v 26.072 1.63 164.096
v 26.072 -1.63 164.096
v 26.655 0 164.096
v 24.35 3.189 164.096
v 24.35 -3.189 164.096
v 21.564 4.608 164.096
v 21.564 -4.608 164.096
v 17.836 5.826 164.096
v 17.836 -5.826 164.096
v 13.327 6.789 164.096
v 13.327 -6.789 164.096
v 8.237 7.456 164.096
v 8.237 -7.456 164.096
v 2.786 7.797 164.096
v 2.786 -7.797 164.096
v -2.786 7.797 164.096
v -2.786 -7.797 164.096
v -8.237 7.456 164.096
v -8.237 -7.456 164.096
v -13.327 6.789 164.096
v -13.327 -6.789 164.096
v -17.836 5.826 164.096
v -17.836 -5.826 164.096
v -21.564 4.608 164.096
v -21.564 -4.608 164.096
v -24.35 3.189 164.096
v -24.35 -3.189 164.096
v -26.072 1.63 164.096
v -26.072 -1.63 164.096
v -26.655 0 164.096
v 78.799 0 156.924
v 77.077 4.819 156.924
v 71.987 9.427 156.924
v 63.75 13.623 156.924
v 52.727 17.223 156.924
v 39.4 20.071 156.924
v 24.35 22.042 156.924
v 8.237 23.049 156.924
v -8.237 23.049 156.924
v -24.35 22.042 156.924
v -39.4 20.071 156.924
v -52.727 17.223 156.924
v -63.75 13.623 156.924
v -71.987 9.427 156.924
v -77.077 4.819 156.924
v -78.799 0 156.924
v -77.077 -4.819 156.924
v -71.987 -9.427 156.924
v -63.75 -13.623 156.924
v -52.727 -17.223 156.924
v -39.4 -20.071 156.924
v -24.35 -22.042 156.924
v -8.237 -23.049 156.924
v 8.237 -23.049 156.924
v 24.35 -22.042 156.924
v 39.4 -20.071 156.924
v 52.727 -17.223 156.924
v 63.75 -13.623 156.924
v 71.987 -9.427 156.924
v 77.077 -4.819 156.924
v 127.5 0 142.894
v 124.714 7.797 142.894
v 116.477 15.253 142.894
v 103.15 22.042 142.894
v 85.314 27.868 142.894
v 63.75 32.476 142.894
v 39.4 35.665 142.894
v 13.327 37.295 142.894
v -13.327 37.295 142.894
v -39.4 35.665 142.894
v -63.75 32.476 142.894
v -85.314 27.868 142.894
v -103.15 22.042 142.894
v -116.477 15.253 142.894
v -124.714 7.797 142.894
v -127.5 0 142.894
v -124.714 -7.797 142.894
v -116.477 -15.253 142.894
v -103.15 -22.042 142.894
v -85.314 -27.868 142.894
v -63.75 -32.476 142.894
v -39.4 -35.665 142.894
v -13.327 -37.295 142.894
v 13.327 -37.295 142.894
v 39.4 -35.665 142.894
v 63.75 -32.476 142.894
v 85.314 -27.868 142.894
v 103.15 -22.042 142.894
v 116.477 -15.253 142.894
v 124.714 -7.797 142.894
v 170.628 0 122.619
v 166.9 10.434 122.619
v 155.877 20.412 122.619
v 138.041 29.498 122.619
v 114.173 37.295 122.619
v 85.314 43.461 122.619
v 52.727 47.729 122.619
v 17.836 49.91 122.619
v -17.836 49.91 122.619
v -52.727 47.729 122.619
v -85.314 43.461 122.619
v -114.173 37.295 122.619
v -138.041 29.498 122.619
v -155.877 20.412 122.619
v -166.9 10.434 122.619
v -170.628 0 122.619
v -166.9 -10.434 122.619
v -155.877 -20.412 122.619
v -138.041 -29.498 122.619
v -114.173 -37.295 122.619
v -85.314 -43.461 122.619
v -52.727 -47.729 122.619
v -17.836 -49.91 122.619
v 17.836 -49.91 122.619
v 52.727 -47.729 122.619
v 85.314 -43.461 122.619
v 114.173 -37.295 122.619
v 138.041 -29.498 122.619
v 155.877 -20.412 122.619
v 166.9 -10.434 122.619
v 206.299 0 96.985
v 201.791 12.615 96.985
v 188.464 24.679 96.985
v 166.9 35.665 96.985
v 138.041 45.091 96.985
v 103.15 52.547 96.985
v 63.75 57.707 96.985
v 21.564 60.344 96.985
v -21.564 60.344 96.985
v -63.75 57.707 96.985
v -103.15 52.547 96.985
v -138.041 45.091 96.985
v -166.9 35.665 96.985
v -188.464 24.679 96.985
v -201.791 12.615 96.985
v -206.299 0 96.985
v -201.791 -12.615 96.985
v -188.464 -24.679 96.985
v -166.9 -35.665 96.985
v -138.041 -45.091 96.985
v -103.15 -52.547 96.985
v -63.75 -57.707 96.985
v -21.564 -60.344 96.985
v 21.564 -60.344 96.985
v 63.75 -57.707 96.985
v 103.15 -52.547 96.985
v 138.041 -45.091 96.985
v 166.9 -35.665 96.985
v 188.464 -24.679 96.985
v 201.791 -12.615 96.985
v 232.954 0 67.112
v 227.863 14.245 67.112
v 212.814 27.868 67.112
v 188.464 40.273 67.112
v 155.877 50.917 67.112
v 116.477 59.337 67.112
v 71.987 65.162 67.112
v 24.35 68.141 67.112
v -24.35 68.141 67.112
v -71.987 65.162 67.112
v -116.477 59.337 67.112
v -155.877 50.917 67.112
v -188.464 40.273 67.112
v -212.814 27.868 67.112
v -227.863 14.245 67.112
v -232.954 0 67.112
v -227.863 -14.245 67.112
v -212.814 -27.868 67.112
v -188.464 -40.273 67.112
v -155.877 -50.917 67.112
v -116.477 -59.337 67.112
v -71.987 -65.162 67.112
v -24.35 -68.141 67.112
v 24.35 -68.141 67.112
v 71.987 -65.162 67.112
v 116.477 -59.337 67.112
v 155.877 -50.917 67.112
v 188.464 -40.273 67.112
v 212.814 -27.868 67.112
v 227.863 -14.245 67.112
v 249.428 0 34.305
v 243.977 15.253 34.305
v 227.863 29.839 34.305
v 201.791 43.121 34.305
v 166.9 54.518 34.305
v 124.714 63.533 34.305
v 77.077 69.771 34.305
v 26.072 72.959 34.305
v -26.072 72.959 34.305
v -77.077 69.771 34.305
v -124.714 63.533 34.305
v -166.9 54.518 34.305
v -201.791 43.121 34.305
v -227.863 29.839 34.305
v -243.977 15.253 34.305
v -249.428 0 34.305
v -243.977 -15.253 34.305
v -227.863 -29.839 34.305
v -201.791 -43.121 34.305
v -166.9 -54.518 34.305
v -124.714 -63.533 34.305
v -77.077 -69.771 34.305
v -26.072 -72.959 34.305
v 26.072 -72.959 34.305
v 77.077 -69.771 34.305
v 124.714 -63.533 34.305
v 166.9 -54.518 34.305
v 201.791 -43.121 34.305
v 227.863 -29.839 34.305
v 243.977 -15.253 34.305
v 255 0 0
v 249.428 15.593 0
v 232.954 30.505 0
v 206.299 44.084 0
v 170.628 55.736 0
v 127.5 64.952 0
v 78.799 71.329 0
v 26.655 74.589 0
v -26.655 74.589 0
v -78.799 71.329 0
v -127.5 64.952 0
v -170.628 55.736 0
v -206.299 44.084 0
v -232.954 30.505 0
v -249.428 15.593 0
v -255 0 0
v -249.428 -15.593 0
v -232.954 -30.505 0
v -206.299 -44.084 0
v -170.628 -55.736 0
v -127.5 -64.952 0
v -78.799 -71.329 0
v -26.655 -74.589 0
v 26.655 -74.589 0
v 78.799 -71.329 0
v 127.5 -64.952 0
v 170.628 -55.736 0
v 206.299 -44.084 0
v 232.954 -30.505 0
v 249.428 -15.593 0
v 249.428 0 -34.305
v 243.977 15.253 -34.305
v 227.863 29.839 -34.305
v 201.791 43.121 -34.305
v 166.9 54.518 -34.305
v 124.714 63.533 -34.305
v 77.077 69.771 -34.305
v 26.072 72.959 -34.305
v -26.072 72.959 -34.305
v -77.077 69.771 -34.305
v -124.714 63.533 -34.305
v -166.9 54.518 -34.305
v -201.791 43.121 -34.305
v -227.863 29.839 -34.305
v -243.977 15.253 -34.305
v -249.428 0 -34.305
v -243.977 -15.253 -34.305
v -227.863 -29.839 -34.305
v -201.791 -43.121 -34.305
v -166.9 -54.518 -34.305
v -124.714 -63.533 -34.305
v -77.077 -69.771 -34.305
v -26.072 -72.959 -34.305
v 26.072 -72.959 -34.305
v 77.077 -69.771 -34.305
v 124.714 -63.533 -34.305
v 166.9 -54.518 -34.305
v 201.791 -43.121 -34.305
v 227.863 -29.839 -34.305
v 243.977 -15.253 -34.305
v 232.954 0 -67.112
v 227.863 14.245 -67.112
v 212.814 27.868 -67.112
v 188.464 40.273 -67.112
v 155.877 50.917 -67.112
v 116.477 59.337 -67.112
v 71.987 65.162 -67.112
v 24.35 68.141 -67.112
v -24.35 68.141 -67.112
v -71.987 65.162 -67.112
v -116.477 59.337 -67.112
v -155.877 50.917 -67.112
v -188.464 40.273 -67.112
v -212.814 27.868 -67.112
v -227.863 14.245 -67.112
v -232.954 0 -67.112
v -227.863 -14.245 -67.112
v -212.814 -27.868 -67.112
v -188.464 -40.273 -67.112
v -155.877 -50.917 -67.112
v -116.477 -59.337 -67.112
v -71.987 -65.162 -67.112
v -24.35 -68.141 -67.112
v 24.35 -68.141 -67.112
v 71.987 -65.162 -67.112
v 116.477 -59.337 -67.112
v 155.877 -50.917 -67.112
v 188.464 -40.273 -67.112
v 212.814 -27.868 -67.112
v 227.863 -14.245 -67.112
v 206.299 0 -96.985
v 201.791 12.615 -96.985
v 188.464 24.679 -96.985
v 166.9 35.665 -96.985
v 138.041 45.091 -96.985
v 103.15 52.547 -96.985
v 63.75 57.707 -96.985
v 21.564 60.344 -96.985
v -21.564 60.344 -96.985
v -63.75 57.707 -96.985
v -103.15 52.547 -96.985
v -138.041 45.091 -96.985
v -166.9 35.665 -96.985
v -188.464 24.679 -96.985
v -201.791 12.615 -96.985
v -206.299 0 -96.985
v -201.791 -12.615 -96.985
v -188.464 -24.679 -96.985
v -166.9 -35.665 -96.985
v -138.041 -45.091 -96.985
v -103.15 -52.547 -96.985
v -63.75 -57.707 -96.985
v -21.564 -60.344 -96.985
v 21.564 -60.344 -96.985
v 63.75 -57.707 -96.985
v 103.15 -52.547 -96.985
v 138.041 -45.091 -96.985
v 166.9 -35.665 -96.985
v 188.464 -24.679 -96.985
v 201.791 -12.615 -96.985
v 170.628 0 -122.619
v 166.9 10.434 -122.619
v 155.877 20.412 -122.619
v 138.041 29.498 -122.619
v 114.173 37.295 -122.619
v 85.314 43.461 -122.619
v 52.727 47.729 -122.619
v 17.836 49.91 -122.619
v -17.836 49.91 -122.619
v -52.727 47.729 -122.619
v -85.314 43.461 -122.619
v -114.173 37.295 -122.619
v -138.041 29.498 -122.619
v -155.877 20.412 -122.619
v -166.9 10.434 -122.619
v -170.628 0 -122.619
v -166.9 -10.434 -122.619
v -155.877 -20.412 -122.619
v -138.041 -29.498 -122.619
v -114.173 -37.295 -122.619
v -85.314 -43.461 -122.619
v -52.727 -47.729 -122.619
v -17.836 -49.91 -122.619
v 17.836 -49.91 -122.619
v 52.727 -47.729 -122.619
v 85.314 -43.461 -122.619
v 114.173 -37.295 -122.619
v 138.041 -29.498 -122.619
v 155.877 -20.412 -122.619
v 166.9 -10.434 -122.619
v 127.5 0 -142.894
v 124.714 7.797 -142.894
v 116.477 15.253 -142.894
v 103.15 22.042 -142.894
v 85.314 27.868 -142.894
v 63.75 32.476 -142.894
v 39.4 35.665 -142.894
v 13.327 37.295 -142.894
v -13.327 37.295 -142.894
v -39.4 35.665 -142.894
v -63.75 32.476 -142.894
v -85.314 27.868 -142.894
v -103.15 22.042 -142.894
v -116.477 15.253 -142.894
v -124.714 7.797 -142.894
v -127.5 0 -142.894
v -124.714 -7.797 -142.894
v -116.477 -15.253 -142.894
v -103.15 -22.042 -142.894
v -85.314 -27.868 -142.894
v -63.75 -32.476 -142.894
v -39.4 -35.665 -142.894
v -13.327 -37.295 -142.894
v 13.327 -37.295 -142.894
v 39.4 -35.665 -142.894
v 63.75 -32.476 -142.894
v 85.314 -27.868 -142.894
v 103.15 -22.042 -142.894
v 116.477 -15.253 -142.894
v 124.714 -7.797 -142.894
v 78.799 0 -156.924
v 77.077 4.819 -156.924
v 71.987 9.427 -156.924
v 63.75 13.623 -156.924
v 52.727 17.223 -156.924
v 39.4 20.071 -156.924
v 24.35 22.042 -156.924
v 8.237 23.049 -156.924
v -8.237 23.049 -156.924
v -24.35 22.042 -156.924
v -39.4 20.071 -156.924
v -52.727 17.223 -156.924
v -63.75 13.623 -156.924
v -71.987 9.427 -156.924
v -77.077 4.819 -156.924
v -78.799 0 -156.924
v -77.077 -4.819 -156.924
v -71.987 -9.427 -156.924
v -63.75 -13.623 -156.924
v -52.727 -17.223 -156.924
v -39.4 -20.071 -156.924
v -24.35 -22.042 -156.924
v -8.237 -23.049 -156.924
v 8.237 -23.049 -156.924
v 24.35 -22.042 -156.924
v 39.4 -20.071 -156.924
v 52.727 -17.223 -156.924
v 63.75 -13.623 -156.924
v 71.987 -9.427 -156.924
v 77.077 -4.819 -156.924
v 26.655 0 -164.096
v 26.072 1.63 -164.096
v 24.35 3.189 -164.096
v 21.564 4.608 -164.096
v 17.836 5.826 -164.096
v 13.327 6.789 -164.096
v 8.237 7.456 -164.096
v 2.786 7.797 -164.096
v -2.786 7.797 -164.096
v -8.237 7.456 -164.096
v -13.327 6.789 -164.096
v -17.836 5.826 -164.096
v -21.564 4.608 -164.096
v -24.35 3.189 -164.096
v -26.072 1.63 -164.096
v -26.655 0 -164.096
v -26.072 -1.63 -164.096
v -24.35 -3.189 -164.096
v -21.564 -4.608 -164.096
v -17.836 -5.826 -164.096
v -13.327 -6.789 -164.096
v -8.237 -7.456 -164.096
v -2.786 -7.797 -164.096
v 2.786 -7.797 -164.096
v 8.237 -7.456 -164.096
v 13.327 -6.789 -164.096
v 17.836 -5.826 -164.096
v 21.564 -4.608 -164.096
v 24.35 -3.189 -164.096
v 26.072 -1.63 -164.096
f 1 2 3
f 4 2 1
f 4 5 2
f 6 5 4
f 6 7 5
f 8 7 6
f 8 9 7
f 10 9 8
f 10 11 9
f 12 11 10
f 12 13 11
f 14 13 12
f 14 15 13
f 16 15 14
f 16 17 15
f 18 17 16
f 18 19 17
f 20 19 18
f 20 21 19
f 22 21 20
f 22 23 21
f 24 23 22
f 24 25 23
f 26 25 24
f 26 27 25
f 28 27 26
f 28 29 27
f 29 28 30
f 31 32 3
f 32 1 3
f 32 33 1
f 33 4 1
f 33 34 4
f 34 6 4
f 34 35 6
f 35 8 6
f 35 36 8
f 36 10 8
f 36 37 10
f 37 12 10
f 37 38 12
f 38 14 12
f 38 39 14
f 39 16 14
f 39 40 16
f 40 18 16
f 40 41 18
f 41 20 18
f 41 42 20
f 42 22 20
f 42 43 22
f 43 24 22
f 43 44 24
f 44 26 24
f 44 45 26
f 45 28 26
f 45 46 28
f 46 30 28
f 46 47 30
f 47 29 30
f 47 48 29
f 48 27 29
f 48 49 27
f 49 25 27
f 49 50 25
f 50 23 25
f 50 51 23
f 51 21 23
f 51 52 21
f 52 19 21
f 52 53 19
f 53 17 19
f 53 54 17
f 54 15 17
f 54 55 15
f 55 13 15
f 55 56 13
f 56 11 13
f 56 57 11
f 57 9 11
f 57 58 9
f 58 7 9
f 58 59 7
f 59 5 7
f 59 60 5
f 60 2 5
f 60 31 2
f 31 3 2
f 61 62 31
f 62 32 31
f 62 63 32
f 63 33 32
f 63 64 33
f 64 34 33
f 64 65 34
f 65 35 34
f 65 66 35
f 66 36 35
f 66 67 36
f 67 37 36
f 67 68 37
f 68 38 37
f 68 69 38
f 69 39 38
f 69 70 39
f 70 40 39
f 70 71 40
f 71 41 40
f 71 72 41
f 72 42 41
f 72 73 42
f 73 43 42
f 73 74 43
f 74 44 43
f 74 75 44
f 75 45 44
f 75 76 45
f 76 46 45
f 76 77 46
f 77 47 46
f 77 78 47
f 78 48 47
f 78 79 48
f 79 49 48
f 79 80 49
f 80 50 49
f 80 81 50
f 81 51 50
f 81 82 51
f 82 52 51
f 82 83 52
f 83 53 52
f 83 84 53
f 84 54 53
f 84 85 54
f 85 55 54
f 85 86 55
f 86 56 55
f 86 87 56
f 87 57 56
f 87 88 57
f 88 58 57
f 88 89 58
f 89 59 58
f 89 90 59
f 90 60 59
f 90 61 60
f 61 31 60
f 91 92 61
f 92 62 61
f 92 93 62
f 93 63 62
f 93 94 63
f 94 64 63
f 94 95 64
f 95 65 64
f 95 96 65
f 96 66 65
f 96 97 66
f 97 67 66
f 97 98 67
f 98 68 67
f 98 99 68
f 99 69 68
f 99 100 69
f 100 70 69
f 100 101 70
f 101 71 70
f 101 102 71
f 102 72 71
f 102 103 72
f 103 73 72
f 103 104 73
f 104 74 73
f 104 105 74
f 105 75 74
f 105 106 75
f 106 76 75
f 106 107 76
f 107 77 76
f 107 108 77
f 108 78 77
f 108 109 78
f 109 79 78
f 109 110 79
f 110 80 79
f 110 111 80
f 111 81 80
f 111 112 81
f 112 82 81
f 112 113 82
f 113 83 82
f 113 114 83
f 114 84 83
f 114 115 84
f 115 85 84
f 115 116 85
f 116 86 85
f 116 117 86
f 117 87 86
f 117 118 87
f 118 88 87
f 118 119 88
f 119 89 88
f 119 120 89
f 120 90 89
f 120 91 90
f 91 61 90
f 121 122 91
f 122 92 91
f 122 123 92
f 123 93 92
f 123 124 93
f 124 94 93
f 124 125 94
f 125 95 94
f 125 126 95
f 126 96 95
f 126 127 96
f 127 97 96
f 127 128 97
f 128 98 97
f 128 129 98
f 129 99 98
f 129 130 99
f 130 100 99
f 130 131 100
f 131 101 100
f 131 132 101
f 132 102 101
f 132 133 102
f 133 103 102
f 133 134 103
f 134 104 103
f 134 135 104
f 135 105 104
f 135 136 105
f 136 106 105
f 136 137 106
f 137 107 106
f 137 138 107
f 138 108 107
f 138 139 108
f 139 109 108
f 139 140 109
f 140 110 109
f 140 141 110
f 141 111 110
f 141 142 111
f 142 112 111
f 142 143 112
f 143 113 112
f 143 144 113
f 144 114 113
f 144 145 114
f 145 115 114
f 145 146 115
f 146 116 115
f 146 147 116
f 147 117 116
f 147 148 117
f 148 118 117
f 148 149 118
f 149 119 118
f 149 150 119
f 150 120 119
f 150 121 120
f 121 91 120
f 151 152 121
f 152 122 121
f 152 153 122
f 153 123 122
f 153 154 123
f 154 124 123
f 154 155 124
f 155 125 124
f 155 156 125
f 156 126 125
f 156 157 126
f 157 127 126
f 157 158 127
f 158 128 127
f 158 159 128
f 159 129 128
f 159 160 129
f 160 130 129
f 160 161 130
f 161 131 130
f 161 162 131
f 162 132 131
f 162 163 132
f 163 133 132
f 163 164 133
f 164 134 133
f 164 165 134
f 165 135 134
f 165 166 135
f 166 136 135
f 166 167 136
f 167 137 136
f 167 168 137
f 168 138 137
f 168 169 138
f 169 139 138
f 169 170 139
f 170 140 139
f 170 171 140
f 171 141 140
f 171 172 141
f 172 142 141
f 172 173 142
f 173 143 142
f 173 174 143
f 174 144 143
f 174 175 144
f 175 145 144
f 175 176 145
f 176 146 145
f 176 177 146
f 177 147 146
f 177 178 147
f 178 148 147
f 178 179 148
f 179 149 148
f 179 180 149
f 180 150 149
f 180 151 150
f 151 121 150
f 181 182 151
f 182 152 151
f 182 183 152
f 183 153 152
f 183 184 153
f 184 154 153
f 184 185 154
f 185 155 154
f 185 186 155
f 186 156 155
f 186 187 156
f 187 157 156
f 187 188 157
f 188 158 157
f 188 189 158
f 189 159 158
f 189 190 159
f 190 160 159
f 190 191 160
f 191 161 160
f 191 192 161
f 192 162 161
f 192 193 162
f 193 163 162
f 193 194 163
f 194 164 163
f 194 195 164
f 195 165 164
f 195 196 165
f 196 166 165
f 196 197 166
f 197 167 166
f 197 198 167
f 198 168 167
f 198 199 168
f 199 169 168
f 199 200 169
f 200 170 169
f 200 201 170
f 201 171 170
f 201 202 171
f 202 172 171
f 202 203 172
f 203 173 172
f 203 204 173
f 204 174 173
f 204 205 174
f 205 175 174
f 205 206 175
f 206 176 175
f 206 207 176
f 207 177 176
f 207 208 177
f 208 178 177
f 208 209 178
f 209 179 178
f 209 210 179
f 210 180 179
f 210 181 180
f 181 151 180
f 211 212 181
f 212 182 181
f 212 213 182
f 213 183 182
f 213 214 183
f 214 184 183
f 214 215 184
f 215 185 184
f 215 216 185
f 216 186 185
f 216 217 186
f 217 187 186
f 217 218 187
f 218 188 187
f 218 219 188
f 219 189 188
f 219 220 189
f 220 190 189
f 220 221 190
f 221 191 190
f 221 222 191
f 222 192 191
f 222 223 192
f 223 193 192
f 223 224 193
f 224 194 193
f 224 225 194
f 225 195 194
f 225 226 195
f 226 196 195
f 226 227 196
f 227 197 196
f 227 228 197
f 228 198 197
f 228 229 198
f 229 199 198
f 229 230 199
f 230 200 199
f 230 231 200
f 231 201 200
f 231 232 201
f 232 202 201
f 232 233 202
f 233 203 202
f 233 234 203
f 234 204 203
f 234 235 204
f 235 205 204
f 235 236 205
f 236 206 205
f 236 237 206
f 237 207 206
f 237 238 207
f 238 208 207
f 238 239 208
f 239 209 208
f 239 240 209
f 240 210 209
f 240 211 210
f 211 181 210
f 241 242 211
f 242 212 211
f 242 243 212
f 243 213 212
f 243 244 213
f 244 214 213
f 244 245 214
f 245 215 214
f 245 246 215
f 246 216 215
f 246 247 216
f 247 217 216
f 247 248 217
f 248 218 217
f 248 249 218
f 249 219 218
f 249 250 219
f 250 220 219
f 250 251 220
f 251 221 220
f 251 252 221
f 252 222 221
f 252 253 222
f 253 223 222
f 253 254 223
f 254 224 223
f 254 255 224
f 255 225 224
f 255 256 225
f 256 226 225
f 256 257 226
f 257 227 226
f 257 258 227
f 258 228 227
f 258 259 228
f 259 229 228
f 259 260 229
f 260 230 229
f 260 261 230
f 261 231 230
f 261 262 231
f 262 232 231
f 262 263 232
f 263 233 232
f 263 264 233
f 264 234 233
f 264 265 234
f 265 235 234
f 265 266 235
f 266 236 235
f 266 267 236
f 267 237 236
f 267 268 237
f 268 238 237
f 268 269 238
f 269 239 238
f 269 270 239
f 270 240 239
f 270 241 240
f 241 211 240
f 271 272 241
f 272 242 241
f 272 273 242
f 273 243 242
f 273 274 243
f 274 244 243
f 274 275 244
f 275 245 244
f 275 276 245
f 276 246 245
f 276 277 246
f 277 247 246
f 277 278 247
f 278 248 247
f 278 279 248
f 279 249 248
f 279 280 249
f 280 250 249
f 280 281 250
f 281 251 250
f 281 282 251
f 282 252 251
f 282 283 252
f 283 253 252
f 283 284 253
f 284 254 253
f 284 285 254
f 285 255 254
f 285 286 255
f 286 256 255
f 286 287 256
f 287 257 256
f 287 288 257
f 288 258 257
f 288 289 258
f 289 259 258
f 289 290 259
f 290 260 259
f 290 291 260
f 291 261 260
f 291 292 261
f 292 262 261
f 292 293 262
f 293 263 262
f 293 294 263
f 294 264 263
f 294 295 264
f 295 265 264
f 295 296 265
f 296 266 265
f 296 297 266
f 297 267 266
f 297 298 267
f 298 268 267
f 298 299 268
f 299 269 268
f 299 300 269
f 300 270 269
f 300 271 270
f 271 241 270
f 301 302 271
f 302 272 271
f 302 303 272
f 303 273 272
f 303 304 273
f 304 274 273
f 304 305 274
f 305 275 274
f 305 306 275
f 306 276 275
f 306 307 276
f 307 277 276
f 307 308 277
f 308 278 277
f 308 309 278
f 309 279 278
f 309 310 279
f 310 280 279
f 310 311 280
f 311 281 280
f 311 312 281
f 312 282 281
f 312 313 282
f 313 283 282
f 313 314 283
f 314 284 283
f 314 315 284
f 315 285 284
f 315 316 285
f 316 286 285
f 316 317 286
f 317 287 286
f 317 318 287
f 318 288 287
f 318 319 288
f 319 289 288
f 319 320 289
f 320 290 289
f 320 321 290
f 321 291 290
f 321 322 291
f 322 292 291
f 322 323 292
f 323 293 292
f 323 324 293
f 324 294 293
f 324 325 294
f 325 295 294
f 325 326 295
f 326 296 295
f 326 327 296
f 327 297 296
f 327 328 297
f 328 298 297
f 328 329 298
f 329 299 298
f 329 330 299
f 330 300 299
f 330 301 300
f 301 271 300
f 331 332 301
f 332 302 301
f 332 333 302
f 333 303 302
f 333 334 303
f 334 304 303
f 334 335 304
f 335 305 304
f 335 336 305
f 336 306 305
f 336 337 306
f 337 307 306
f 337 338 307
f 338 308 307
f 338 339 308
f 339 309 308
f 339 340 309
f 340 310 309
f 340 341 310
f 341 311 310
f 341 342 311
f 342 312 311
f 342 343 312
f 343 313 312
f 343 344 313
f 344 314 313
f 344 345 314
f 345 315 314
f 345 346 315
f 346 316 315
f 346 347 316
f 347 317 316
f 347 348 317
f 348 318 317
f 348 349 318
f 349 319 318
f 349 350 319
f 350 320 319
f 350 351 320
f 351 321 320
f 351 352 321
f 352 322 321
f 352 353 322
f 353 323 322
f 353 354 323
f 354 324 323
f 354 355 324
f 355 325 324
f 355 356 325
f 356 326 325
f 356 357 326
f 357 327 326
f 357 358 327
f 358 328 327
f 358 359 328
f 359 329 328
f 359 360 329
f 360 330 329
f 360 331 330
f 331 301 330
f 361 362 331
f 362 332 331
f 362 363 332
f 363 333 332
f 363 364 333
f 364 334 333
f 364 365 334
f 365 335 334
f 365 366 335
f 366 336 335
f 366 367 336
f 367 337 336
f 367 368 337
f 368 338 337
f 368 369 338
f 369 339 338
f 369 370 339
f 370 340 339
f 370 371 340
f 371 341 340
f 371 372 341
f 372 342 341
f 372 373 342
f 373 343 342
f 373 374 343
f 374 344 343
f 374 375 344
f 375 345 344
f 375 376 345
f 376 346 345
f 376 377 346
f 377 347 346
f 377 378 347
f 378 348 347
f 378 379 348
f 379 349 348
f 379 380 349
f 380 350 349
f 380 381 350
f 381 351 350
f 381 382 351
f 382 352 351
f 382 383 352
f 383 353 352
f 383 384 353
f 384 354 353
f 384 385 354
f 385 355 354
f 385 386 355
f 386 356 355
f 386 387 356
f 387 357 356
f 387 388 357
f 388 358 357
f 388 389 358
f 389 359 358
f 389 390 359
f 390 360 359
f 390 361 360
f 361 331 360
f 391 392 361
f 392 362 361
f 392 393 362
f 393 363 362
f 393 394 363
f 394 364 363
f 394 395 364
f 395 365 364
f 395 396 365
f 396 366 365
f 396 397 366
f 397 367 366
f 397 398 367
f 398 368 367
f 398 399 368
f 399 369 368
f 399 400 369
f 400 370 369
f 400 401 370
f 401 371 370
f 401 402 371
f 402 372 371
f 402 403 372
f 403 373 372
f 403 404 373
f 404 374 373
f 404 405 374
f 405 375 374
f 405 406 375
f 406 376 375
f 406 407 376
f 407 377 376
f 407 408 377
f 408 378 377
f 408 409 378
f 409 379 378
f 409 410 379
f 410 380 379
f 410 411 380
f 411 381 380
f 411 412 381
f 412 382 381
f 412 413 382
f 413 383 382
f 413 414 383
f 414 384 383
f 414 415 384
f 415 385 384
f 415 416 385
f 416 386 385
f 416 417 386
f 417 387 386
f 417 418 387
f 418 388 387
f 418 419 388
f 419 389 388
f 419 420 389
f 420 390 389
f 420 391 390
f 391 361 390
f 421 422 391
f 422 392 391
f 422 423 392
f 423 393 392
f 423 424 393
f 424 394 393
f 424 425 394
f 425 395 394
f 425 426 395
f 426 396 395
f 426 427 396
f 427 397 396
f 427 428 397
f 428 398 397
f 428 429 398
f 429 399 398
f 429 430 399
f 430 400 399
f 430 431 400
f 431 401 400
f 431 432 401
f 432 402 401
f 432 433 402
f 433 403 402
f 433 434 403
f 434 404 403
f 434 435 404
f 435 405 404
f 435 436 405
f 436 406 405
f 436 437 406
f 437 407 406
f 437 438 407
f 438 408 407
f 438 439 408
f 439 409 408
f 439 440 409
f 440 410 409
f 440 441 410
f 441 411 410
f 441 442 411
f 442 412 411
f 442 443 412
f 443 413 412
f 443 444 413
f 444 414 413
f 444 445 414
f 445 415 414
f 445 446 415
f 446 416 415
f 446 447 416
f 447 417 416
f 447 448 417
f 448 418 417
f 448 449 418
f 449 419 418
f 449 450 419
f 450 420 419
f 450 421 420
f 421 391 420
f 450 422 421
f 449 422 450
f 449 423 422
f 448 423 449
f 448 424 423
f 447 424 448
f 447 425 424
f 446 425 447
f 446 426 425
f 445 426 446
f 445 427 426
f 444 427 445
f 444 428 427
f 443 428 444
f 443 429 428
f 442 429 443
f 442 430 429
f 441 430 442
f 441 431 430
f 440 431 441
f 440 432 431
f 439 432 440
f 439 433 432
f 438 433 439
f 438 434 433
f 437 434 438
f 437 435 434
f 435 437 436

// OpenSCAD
// Generated by SolidPython 1.0.1 on 2020-07-29 00:46:52


scale(v = [17, 5, 11]) {
	sphere(r = 15);
}
/***********************************************
*********      SolidPython code:      **********
************************************************
 
# import packages: SolidPython
from solid import *
from solid.utils import *
from itertools import chain, combinations, permutations


class Resize:

    def __init__(self, scad_file):
        self.scad_file = scad_file
        #self.scad_file = import_scad(scad_file)
        # cone/cylinder param:
        self.r1 = 0
        self.r2 = 0
        self.h = 0
        # rectangular prism param:
        self.w = 0
        self.l = 0
        # ellipse param:
        self.r = 0

    # import OpenScad code (file name corresponds to shape)


    # classify shape + parameters
    def assign(self, param1, param2, param3):
        if self.scad_file == 'cone.scad':
            self.r1 = param1
            self.r2 = param2
            self.h = param3
        elif self.scad_file == 'cylinder.scad':
            self.r1 = param1
            self.r2 = param2
            self.h = param3
        elif self.scad_file == 'rectangularPrism.scad':
            self.h = param1
            self.l = param2
            self.w = param3
        else:
            self.r = param1
            self.h = param2

    # resize parameters
    def iterate(self):
        x = range(3, 20, 2)
        i = 1
        if self.scad_file == 'cone.scad':
            tempList = list(permutations(x, 2))
            for temp in tempList:
                param1 = temp[0]
                param2 = temp[1]
                filepath = 'produced_scad_files/' + 'cone' + str(param1) + '_' + str(param2) + '_' + '.scad'
                scad_render_to_file(cylinder(h=param1, r1=param2, r2=0), filepath)

        elif self.scad_file == 'cylinder.scad':
            tempList = list(permutations(x, 3))
            for temp in tempList:
                param1 = temp[0]
                param2 = temp[1]
                filepath = 'produced_scad_files/' + 'cylinder' + str(param1) + '_' + str(param2) + '_' + '.scad'
                scad_render_to_file(cylinder(h=param1, r1=param2, r2=param2), filepath)

        elif self.scad_file == 'rectangularPrism.scad':
            tempList = list(permutations(x, 3))
            for temp in tempList:
                param1 = temp[0]
                param2 = temp[1]
                param3 = temp[2]
                filepath = 'produced_scad_files/' + 'rectangularPrism' + str(param1) + '_' + str(param2) + '_' + str(
                    param3) + '.scad'
                scad_render_to_file(cube(size=(param1, param2, param3)), filepath)

        elif self.scad_file == 'ellipse.scad':
            tempList = list(permutations(x, 4))
            for temp in tempList:
                param1 = temp[0]
                param2 = temp[1]
                param3 = temp[2]
                param4 = temp[3]
                filepath = 'produced_scad_files/' + 'ellipse' + str(param1) + '_' + str(param2) + '_' + str(param3) + '_' + str(param4) + '.scad'
                scad_render_to_file(scale([param1, param2, param3])(sphere(r=param4)), filepath)

    def render_to_scadfile(self):
        scad_render_to_file(scad, 'example.scad') 
 
************************************************/
